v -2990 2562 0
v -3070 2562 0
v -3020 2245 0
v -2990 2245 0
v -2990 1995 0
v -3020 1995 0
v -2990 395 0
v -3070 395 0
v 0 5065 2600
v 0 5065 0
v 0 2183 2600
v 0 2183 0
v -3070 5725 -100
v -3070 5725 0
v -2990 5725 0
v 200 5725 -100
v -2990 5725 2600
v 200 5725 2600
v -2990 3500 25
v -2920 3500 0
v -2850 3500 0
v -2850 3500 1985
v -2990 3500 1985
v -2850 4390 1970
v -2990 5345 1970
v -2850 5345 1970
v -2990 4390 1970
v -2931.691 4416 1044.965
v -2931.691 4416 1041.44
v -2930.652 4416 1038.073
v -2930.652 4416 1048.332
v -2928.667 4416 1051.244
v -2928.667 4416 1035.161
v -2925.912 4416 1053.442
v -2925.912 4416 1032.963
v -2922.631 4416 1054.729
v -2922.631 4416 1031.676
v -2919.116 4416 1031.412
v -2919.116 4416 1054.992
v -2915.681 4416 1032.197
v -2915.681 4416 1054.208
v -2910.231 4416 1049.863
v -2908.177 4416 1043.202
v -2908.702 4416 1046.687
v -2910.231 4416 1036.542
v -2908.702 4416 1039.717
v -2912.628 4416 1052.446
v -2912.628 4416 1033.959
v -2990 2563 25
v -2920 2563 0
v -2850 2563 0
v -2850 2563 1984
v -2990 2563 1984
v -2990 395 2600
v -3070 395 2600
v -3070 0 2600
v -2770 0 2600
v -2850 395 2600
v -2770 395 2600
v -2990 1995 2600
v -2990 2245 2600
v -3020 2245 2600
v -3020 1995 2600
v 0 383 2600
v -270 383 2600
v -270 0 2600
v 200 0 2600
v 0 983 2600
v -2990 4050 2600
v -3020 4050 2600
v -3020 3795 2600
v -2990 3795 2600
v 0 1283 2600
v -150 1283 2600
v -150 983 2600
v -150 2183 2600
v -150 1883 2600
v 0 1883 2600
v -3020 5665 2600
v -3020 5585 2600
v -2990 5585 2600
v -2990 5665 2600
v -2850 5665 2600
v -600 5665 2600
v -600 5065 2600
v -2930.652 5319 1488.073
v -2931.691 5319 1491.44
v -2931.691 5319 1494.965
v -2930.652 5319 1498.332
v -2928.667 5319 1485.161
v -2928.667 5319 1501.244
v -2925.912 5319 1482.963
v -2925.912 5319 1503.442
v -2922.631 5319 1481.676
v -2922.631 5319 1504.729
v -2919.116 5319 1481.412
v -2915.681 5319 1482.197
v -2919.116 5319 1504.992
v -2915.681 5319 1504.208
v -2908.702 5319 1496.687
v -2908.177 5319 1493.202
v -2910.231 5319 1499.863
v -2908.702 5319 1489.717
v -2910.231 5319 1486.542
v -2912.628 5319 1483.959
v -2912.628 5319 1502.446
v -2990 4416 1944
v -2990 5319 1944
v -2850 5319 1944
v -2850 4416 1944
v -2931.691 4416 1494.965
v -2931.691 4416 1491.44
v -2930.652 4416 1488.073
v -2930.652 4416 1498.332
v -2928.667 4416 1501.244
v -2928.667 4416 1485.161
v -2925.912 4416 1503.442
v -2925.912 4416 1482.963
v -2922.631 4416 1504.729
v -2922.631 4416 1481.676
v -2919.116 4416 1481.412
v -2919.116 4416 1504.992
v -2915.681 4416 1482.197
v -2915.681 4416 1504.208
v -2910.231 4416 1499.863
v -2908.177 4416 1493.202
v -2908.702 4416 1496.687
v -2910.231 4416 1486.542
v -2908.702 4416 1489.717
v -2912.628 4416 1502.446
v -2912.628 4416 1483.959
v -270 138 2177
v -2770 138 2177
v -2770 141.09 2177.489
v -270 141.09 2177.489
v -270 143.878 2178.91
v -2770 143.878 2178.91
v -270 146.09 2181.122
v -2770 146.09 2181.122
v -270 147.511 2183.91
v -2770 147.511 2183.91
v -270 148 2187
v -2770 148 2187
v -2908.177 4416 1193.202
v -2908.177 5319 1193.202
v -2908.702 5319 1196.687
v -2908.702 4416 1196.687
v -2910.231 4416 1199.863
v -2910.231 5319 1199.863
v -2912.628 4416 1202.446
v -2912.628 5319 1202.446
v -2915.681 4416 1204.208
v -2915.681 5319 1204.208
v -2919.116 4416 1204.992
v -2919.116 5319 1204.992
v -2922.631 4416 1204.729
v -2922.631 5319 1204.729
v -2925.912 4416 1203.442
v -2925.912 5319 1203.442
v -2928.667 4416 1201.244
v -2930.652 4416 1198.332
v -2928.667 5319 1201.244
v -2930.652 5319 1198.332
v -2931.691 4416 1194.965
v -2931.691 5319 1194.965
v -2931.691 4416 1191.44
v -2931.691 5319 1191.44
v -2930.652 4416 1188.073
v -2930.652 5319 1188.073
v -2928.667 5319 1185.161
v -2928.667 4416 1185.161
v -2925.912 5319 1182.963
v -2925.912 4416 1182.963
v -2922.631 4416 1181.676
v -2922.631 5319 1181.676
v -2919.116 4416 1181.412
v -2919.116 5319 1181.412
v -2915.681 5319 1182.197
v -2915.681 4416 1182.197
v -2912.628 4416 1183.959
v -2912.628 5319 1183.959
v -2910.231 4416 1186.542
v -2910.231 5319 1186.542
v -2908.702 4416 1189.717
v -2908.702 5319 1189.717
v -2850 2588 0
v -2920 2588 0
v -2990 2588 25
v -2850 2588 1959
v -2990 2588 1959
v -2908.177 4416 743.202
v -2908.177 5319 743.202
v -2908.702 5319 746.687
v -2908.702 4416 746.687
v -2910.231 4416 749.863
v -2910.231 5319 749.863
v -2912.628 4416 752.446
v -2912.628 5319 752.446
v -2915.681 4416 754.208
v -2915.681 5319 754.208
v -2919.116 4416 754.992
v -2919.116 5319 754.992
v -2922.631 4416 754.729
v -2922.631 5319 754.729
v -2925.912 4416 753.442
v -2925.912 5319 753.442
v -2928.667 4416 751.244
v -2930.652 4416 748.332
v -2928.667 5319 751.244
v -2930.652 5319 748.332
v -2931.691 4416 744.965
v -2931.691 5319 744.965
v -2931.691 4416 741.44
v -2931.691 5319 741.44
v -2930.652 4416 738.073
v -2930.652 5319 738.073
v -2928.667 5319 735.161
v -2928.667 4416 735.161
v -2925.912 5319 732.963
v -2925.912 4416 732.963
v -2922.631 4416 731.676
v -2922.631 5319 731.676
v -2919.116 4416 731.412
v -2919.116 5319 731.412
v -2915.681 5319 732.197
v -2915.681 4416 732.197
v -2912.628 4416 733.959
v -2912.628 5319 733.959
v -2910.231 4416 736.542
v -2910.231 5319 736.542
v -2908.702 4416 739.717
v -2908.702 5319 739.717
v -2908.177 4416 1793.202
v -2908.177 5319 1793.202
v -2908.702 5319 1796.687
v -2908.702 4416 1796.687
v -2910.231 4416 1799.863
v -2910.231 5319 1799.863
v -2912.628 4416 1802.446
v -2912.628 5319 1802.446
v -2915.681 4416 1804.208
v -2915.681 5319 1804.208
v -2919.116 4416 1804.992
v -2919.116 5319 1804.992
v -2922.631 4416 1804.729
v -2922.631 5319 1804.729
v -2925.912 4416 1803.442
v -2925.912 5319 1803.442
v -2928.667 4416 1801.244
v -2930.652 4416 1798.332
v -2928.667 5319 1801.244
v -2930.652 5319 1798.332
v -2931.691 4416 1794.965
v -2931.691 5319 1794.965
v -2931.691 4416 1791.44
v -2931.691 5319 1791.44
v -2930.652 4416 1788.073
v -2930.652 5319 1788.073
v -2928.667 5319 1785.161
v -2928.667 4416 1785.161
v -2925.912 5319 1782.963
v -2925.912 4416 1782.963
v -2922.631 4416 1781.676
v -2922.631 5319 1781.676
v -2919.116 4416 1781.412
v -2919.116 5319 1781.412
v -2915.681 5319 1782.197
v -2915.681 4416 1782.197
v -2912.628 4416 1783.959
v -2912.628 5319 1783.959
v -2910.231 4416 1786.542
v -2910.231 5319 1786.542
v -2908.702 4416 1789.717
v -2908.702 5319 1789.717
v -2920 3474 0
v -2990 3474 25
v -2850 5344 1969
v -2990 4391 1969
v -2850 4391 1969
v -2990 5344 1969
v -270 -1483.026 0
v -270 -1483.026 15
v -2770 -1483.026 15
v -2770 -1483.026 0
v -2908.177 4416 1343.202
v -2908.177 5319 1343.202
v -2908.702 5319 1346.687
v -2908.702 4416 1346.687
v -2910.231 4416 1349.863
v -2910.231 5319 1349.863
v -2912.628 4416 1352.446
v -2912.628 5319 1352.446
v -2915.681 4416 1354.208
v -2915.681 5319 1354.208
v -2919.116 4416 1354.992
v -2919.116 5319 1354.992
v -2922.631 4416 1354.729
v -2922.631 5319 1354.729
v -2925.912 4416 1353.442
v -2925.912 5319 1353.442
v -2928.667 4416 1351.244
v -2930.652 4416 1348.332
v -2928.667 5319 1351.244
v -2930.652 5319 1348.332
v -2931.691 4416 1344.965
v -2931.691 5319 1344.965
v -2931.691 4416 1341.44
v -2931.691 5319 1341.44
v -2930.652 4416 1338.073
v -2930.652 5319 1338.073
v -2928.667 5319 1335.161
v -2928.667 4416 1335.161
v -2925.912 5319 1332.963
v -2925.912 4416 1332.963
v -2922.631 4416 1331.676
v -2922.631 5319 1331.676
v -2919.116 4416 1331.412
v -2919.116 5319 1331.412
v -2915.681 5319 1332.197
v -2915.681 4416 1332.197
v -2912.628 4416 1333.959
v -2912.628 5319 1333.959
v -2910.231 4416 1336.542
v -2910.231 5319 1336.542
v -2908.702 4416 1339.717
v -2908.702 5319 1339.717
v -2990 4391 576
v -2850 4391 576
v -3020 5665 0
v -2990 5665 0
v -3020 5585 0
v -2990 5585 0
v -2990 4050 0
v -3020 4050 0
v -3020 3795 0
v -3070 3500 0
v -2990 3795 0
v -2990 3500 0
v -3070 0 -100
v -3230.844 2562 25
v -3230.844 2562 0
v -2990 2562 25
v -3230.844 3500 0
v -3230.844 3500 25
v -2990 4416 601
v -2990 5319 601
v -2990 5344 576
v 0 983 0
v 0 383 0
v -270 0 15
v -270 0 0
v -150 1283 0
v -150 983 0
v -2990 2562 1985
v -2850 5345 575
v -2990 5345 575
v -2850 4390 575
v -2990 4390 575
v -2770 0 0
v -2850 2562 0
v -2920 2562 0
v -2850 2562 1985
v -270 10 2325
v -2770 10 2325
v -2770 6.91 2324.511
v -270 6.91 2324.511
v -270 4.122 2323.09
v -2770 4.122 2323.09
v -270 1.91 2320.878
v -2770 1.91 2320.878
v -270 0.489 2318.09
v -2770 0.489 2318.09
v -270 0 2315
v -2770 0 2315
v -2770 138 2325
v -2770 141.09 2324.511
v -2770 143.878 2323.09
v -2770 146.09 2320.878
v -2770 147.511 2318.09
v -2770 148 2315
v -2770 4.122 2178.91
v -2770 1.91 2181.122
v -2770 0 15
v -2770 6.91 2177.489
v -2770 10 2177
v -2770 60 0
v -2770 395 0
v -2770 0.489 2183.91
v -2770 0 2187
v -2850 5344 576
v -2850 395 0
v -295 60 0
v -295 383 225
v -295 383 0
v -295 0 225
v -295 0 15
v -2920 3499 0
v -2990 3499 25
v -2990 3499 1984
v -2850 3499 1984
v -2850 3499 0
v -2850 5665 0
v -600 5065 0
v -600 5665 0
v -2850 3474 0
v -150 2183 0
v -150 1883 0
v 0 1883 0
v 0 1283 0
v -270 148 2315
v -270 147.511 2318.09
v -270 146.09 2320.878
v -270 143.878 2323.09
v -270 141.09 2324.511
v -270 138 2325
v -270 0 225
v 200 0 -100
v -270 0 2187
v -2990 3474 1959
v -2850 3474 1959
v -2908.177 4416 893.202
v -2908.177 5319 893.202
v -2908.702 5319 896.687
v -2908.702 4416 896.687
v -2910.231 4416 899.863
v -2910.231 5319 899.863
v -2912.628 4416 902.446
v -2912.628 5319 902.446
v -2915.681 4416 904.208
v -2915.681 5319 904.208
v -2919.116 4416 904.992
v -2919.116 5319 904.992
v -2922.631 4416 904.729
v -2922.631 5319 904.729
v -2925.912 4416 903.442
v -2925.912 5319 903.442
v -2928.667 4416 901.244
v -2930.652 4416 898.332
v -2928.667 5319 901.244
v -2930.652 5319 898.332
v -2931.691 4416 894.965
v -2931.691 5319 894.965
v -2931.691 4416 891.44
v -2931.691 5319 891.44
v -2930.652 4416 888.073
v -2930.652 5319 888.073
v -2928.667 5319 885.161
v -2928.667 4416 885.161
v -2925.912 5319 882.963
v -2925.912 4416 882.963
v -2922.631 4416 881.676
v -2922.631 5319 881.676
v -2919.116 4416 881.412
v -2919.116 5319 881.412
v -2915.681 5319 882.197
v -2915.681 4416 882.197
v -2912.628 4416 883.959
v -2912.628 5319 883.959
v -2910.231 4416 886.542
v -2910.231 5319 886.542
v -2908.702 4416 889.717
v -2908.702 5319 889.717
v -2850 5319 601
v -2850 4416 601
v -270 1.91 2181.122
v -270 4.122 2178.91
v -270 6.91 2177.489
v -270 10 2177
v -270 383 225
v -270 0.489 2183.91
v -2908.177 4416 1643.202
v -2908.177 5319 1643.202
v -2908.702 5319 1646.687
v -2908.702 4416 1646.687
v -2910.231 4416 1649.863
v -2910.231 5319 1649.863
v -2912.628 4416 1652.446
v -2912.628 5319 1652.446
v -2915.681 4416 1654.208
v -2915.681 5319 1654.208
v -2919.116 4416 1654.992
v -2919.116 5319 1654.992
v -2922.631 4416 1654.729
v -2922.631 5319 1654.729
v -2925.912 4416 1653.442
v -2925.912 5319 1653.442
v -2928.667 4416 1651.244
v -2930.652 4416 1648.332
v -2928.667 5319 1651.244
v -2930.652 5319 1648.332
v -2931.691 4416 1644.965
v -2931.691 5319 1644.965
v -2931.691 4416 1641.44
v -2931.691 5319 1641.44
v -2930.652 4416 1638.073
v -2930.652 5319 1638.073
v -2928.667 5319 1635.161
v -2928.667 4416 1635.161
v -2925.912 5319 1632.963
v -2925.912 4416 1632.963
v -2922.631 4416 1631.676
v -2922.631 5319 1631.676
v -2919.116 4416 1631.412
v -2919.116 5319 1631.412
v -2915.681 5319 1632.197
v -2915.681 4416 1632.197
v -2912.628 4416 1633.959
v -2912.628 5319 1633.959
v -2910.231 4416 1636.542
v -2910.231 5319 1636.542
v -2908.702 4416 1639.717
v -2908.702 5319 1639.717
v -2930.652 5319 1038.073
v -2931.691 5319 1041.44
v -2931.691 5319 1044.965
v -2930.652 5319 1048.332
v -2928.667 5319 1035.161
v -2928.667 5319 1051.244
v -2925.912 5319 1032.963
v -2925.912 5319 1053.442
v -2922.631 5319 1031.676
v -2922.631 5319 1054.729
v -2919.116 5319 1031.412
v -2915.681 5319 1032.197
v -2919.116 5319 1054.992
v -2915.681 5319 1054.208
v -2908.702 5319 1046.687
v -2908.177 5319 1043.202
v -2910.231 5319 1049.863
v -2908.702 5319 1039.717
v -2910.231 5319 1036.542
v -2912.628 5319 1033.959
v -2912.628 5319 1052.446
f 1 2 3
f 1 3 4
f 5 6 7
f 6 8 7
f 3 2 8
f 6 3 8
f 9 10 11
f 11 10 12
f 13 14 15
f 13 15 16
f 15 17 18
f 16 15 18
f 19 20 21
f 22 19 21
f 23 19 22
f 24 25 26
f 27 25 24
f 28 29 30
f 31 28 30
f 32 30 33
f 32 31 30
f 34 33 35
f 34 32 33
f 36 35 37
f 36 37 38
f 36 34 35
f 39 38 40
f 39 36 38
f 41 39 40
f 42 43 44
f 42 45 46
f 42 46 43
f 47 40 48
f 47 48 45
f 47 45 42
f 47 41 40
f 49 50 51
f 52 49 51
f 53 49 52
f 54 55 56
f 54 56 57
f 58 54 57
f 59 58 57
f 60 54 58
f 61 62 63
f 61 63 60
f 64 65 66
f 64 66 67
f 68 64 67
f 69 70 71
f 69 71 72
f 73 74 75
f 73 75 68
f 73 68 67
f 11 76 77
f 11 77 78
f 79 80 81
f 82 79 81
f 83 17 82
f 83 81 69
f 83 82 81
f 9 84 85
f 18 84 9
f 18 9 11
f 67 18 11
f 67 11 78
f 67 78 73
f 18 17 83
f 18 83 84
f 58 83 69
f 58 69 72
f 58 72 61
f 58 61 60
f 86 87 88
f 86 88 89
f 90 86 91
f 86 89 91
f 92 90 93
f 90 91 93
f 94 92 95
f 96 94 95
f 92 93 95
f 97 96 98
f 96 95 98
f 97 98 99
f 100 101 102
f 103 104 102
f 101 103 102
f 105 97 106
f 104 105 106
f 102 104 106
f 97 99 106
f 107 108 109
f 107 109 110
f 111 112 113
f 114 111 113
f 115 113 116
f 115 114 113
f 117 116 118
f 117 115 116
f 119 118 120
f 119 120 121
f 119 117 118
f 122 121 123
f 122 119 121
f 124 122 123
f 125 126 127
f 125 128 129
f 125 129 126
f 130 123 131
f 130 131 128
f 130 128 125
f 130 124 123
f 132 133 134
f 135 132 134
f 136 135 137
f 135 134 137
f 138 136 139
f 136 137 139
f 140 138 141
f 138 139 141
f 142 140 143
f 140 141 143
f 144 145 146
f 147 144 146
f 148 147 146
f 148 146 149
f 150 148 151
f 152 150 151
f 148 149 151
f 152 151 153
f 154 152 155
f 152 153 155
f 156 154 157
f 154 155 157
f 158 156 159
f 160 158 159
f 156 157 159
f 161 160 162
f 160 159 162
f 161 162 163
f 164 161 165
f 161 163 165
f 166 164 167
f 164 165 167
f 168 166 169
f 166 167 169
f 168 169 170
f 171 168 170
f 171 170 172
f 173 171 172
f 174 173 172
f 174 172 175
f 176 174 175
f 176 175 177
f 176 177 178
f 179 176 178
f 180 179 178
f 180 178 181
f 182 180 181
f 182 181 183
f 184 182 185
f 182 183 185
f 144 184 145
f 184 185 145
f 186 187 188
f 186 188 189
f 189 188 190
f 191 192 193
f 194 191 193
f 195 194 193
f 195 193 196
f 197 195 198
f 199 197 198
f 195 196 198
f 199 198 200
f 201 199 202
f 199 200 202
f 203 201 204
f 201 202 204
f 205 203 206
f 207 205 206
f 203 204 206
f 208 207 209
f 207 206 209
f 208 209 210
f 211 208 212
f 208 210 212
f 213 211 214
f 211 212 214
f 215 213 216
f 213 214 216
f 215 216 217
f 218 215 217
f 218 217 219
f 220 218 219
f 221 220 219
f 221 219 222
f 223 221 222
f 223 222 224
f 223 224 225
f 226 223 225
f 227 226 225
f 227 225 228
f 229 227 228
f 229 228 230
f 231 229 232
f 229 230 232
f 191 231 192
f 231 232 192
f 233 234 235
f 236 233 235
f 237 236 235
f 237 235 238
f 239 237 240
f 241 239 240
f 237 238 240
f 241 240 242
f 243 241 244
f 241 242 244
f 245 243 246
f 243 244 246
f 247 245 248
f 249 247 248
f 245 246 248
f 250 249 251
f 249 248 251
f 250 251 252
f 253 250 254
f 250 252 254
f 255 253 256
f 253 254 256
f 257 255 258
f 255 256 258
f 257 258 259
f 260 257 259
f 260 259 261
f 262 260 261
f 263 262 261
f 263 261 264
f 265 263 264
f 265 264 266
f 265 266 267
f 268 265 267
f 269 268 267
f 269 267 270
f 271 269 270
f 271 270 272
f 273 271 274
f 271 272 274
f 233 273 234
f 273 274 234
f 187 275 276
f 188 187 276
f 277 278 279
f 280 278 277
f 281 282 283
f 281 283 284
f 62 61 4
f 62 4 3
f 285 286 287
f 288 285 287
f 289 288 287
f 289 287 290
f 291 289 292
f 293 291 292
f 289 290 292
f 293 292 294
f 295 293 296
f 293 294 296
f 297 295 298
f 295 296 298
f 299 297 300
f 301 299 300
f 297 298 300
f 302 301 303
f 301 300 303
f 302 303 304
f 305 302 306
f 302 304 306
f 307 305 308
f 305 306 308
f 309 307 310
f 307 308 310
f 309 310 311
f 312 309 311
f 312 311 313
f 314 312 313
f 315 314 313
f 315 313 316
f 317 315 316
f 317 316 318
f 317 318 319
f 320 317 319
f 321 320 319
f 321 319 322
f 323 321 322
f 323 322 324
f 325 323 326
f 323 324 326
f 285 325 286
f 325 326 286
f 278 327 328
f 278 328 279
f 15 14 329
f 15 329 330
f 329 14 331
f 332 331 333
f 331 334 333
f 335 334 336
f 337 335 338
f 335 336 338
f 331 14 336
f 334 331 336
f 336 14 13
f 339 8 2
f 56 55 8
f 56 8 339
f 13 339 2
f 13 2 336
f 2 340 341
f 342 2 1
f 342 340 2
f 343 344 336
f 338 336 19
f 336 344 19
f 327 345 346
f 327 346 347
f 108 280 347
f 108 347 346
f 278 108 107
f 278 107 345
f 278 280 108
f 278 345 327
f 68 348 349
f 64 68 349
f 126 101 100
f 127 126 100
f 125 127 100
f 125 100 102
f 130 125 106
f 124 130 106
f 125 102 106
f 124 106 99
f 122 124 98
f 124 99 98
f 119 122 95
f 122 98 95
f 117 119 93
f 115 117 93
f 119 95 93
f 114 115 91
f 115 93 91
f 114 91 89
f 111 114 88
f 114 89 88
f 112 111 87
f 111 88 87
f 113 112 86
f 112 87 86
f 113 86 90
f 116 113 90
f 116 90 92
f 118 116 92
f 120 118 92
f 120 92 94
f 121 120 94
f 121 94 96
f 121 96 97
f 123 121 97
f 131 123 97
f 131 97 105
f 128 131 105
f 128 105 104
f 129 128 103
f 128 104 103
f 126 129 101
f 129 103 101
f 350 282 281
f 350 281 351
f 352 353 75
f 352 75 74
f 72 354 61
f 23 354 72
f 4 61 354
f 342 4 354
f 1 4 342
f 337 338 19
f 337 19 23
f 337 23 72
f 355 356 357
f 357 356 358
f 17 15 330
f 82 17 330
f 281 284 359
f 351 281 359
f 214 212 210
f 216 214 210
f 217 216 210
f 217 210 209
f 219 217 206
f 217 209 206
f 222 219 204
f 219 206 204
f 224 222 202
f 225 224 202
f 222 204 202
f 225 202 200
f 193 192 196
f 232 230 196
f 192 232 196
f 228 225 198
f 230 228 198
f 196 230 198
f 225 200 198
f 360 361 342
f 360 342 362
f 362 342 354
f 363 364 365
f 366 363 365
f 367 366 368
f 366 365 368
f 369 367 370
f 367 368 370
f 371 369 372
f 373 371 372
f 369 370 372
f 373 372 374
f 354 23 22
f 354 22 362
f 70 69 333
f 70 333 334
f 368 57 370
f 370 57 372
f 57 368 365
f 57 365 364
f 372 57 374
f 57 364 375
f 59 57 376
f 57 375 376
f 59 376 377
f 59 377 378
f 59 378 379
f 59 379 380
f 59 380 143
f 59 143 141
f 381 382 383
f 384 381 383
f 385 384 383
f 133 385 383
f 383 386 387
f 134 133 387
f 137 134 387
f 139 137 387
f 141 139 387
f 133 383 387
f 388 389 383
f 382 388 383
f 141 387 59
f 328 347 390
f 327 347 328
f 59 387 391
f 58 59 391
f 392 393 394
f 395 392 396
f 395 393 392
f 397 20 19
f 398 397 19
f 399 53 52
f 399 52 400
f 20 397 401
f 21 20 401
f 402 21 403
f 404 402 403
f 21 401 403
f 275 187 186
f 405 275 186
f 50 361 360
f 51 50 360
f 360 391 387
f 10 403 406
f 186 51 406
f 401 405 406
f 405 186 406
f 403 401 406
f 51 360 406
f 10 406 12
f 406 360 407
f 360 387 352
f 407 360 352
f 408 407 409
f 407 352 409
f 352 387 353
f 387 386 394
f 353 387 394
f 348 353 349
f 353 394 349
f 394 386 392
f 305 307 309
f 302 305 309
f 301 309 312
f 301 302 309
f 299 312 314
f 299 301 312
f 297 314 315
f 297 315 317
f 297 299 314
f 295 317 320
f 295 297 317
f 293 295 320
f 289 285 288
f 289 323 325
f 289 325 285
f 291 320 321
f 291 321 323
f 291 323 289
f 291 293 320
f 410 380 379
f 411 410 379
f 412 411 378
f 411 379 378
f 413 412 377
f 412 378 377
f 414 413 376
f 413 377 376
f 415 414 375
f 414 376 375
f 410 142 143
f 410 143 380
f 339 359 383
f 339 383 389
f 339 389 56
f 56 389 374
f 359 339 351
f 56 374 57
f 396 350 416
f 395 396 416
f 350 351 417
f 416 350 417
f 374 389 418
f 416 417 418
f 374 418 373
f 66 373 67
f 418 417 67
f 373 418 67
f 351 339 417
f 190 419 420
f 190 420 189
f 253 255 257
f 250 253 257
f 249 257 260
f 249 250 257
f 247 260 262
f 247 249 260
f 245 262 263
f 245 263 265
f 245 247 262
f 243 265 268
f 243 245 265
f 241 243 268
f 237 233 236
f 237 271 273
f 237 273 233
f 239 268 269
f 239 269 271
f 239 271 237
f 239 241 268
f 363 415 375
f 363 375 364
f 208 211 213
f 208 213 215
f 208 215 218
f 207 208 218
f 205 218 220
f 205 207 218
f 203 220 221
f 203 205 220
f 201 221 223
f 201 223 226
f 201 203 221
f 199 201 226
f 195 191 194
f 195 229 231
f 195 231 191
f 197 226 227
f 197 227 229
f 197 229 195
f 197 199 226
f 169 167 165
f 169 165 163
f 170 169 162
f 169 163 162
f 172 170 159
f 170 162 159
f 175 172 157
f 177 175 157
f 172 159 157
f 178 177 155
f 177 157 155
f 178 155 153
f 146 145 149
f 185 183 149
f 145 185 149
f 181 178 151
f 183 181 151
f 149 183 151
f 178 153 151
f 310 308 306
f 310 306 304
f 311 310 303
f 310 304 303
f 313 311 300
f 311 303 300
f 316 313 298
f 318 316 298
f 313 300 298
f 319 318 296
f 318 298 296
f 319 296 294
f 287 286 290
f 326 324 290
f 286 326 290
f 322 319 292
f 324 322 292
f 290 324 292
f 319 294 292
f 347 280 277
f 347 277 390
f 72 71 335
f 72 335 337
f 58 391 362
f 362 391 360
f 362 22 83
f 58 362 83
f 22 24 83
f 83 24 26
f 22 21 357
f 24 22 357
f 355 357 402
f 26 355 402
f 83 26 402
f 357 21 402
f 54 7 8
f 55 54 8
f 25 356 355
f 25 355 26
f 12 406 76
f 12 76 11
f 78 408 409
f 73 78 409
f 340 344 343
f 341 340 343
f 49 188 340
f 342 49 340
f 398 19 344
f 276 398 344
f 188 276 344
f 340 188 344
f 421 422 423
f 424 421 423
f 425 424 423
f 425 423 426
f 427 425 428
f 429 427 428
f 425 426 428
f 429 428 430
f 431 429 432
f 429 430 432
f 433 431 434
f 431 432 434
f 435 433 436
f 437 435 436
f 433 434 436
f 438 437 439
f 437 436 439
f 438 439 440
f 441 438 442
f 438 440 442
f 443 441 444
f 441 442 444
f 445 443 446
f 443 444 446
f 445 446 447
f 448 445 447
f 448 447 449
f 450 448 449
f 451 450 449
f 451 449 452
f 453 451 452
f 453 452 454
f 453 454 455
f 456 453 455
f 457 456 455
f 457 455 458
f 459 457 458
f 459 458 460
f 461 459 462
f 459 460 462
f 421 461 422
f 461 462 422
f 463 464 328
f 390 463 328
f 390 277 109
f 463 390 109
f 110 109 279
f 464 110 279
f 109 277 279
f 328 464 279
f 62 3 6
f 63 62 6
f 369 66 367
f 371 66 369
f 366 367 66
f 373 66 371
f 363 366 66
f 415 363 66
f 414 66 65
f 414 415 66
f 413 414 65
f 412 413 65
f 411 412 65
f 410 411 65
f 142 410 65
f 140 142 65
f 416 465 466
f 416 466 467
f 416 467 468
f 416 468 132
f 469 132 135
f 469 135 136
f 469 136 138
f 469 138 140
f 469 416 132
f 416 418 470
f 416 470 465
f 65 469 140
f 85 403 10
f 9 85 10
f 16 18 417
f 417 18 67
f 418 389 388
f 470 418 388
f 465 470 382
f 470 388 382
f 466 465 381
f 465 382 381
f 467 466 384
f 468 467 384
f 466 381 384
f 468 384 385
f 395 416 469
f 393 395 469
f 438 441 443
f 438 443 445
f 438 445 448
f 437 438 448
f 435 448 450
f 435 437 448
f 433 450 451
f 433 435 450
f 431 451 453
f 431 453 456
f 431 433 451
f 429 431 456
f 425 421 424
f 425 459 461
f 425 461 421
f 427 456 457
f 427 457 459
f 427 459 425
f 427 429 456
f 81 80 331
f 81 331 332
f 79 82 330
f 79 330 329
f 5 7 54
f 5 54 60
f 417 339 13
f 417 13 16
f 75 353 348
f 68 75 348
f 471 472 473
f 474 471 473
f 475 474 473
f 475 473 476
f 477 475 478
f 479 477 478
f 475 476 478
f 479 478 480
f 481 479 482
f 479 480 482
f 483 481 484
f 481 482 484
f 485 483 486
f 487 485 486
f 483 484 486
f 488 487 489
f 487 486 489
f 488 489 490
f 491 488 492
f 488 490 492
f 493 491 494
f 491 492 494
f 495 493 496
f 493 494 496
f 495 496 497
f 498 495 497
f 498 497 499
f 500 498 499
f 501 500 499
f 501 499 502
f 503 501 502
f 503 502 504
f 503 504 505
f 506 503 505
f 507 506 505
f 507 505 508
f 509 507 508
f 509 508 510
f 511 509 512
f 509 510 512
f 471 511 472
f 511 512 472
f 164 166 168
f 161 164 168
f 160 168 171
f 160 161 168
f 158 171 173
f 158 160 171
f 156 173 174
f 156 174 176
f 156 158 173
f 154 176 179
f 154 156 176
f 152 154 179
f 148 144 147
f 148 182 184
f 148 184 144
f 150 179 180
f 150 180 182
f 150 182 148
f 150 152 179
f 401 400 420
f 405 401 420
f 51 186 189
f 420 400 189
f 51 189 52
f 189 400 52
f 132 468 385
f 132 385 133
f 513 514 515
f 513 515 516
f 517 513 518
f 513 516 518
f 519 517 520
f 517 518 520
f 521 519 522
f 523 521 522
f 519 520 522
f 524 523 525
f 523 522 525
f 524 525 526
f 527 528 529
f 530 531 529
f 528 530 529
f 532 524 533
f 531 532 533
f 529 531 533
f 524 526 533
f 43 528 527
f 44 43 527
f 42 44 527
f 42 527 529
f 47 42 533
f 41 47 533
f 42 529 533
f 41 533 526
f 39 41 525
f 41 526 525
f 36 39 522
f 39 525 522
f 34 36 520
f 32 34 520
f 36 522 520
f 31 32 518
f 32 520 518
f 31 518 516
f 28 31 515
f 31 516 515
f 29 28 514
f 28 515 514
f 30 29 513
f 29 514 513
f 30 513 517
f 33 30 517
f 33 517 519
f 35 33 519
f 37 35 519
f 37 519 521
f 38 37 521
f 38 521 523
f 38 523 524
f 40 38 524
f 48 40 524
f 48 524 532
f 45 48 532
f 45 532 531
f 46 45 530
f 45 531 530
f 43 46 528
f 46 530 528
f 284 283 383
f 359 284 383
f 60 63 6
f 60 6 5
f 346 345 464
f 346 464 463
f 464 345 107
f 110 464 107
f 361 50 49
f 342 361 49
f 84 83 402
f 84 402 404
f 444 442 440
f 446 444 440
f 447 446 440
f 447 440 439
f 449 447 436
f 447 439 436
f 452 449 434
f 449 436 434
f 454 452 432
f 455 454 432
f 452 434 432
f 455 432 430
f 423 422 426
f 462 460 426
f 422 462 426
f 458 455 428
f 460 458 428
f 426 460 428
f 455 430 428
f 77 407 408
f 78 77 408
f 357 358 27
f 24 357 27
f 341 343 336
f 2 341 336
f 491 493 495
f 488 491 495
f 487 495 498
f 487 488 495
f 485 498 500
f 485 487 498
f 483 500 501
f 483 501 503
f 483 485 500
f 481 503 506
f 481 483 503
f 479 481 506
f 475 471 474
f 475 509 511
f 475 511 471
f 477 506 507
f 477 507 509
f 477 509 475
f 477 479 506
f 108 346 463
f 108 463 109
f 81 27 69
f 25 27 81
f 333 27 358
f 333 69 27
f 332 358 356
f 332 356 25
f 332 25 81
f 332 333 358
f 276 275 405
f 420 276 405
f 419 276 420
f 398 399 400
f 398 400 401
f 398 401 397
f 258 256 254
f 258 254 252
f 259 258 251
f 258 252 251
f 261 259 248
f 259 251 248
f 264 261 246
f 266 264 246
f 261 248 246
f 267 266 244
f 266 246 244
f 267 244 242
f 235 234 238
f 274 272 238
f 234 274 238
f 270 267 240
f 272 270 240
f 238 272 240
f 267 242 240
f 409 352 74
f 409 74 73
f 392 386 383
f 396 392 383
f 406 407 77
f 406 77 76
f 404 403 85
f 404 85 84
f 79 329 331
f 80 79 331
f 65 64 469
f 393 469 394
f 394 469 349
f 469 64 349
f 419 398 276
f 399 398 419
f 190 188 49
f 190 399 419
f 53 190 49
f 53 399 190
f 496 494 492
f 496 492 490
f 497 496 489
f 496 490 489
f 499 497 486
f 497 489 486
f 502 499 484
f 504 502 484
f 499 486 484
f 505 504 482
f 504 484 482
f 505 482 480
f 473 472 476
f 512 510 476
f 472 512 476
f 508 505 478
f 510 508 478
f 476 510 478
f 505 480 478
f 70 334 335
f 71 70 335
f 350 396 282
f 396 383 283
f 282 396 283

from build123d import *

# Parameters (mm, degrees)
F0_W      = 270
F0_H      = 383
F0_W_2    = 150
F0_H_2    = 300
F0_W_3    = 600
F0_H_3    = 600
F0_W_4    = 140
F0_H_4    = 1535
F0_H_5    = 1550
F0_H_6    = 1600
F1_DEPTH  = 2600
F2_W      = 3270
F2_H      = 5725
F3_DEPTH  = 100
F5_DEPTH  = 2500
F6_W      = 938
F6_H      = 1985
F7_DEPTH  = 140
F8_W      = 955
F8_H      = 1395
F9_DEPTH  = 140
F11_DEPTH = 938
F13_DEPTH = 25
F15_DEPTH = 2500
F16_W     = 25
F16_H     = 1959
F17_DEPTH = 140
F18_W     = 25
F18_H     = 1343
F19_DEPTH = 140
F20_R     = 11.823162
F21_DEPTH = 903


with BuildPart() as f1:
    # F0 (on Top) → F1 (new body)
    with BuildSketch(Plane.XY):
        with Locations((-135, 191.5)):
            Rectangle(F0_W, F0_H)
        Polygon((0, 383), (0, 0), (200, 0), (200, 5665), (0, 5665), (0, 5065), (0, 2183), (0, 1883), (0, 1283), (0, 983), align=None)
        with Locations((-75, 1133)):
            Rectangle(F0_W_2, F0_H_2)
        Polygon((0, 5665), (200, 5665), (200, 5725), (-2990, 5725), (-2990, 5665), (-2850, 5665), (-600, 5665), align=None)
        with Locations((-300, 5365)):
            Rectangle(F0_W_3, F0_H_3)
        with Locations((-75, 2033)):
            Rectangle(F0_W_2, F0_H_2)
        Polygon((-2850, 5585), (-2850, 5665), (-2990, 5665), (-3020, 5665), (-3020, 5585), (-2990, 5585), align=None)
        with Locations((-2920, 4817.5)):
            Rectangle(F0_W_4, F0_H_4)
        Polygon((-2850, 3795), (-2850, 4050), (-2990, 4050), (-3020, 4050), (-3020, 3795), (-2990, 3795), align=None)
        with Locations((-2920, 3020)):
            Rectangle(F0_W_4, F0_H_5)
        Polygon((-2850, 1995), (-2850, 2245), (-2990, 2245), (-3020, 2245), (-3020, 1995), (-2990, 1995), align=None)
        with Locations((-2920, 1195)):
            Rectangle(F0_W_4, F0_H_6)
        Polygon((-2770, 395), (-2850, 395), (-2990, 395), (-3070, 395), (-3070, 0), (-2770, 0), align=None)
    extrude(amount=F1_DEPTH)

    # F2 (on face) → F3 (join)
    with BuildSketch(Plane(origin=(0, 0, 0), x_dir=(1, 0, 0), z_dir=(0, 0, -1))):
        with Locations((-1435, -2862.5)):
            Rectangle(F2_W, F2_H)
    extrude(amount=F3_DEPTH)

    # F4 (on face) → F5 (join, through all)
    with BuildSketch(Plane.YZ.offset(-2770)):
        Polygon((-1483.026147, 0), (0, 0), (60, 0), (0, 15), (-1483.026147, 15), align=None)
    extrude(amount=F5_DEPTH)

    # F6 (on face) → F7 (cut, through all)
    with BuildSketch(Plane(origin=(-2990, 0, 0), x_dir=(0, -1, 0), z_dir=(-1, 0, 0))):
        with Locations((-3031, 992.5)):
            Rectangle(F6_W, F6_H)
    extrude(amount=-F7_DEPTH, mode=Mode.SUBTRACT)

    # F8 (on face) → F9 (cut, through all)
    with BuildSketch(Plane(origin=(-2990, 0, 0), x_dir=(0, -1, 0), z_dir=(-1, 0, 0))):
        with Locations((-4867.5, 1272.5)):
            Rectangle(F8_W, F8_H)
    extrude(amount=-F9_DEPTH, mode=Mode.SUBTRACT)

    # F10 (on face) → F11 (join, through all)
    with BuildSketch(Plane.XZ.offset(-3500)):
        Polygon((-3230.844469, 0), (-2920, 0), (-2990, 25), (-3230.844469, 25), align=None)
    extrude(amount=F11_DEPTH)

    # F12 (on face) → F13 (join)
    with BuildSketch(Plane(origin=(-270, 0, 0), x_dir=(0, -1, 0), z_dir=(-1, 0, 0))):
        Polygon((-383, 225), (-383, 0), (-60, 0), (0, 15), (0, 225), align=None)
    extrude(amount=F13_DEPTH)

    # F14 (on face) → F15 (join, through all)
    with BuildSketch(Plane.YZ.offset(-2770)):
        with BuildLine():
            Line((138, 2325), (10, 2325))
            ThreePointArc((10, 2325), (2.928932, 2322.071068), (0, 2315))
            Line((0, 2315), (0, 2187))
            ThreePointArc((0, 2187), (2.928932, 2179.928932), (10, 2177))
            Line((10, 2177), (138, 2177))
            ThreePointArc((138, 2177), (145.071068, 2179.928932), (148, 2187))
            Line((148, 2187), (148, 2315))
            ThreePointArc((148, 2315), (145.071068, 2322.071068), (138, 2325))
        make_face()
    extrude(amount=F15_DEPTH)

    # F16 (on face) → F17 (join, through all)
    with BuildSketch(Plane(origin=(-2990, 0, 0), x_dir=(0, -1, 0), z_dir=(-1, 0, 0))):
        Polygon((-2563, 1984), (-3499, 1984), (-3499, 1959), (-3474, 1959), (-2588, 1959), (-2563, 1959), align=None)
        with Locations((-3486.5, 979.5)):
            Rectangle(F16_W, F16_H)
        with Locations((-2575.5, 979.5)):
            Rectangle(F16_W, F16_H)
    extrude(amount=-F17_DEPTH)


with BuildPart() as f19:
    # F18 (on face) → F19 (new body, through all)
    with BuildSketch(Plane(origin=(-2990, 0, 0), x_dir=(0, -1, 0), z_dir=(-1, 0, 0))):
        Polygon((-4391, 1969), (-5344, 1969), (-5344, 1944), (-5319, 1944), (-4416, 1944), (-4391, 1944), align=None)
        Polygon((-5319, 1944), (-5344, 1944), (-5344, 576), (-5319, 576), (-5319, 601), align=None)
        with Locations((-4403.5, 1272.5)):
            Rectangle(F18_W, F18_H)
        Polygon((-4391, 576), (-4391, 601), (-4416, 601), (-5319, 601), (-5319, 576), align=None)
    extrude(amount=-F19_DEPTH)


with BuildPart() as f21:
    # F20 (on face) → F21 (new body, through all)
    with BuildSketch(Plane.XZ.offset(-5319)):
        with Locations((-2920, 743.202388)):
            Circle(F20_R)
        with Locations((-2920, 893.202388)):
            Circle(F20_R)
        with Locations((-2920, 1043.202388)):
            Circle(F20_R)
        with Locations((-2920, 1193.202388)):
            Circle(F20_R)
        with Locations((-2920, 1343.202388)):
            Circle(F20_R)
        with Locations((-2920, 1493.202388)):
            Circle(F20_R)
        with Locations((-2920, 1643.202388)):
            Circle(F20_R)
        with Locations((-2920, 1793.202388)):
            Circle(F20_R)
    extrude(amount=F21_DEPTH)


solid = Compound([f1.part, f19.part, f21.part])
